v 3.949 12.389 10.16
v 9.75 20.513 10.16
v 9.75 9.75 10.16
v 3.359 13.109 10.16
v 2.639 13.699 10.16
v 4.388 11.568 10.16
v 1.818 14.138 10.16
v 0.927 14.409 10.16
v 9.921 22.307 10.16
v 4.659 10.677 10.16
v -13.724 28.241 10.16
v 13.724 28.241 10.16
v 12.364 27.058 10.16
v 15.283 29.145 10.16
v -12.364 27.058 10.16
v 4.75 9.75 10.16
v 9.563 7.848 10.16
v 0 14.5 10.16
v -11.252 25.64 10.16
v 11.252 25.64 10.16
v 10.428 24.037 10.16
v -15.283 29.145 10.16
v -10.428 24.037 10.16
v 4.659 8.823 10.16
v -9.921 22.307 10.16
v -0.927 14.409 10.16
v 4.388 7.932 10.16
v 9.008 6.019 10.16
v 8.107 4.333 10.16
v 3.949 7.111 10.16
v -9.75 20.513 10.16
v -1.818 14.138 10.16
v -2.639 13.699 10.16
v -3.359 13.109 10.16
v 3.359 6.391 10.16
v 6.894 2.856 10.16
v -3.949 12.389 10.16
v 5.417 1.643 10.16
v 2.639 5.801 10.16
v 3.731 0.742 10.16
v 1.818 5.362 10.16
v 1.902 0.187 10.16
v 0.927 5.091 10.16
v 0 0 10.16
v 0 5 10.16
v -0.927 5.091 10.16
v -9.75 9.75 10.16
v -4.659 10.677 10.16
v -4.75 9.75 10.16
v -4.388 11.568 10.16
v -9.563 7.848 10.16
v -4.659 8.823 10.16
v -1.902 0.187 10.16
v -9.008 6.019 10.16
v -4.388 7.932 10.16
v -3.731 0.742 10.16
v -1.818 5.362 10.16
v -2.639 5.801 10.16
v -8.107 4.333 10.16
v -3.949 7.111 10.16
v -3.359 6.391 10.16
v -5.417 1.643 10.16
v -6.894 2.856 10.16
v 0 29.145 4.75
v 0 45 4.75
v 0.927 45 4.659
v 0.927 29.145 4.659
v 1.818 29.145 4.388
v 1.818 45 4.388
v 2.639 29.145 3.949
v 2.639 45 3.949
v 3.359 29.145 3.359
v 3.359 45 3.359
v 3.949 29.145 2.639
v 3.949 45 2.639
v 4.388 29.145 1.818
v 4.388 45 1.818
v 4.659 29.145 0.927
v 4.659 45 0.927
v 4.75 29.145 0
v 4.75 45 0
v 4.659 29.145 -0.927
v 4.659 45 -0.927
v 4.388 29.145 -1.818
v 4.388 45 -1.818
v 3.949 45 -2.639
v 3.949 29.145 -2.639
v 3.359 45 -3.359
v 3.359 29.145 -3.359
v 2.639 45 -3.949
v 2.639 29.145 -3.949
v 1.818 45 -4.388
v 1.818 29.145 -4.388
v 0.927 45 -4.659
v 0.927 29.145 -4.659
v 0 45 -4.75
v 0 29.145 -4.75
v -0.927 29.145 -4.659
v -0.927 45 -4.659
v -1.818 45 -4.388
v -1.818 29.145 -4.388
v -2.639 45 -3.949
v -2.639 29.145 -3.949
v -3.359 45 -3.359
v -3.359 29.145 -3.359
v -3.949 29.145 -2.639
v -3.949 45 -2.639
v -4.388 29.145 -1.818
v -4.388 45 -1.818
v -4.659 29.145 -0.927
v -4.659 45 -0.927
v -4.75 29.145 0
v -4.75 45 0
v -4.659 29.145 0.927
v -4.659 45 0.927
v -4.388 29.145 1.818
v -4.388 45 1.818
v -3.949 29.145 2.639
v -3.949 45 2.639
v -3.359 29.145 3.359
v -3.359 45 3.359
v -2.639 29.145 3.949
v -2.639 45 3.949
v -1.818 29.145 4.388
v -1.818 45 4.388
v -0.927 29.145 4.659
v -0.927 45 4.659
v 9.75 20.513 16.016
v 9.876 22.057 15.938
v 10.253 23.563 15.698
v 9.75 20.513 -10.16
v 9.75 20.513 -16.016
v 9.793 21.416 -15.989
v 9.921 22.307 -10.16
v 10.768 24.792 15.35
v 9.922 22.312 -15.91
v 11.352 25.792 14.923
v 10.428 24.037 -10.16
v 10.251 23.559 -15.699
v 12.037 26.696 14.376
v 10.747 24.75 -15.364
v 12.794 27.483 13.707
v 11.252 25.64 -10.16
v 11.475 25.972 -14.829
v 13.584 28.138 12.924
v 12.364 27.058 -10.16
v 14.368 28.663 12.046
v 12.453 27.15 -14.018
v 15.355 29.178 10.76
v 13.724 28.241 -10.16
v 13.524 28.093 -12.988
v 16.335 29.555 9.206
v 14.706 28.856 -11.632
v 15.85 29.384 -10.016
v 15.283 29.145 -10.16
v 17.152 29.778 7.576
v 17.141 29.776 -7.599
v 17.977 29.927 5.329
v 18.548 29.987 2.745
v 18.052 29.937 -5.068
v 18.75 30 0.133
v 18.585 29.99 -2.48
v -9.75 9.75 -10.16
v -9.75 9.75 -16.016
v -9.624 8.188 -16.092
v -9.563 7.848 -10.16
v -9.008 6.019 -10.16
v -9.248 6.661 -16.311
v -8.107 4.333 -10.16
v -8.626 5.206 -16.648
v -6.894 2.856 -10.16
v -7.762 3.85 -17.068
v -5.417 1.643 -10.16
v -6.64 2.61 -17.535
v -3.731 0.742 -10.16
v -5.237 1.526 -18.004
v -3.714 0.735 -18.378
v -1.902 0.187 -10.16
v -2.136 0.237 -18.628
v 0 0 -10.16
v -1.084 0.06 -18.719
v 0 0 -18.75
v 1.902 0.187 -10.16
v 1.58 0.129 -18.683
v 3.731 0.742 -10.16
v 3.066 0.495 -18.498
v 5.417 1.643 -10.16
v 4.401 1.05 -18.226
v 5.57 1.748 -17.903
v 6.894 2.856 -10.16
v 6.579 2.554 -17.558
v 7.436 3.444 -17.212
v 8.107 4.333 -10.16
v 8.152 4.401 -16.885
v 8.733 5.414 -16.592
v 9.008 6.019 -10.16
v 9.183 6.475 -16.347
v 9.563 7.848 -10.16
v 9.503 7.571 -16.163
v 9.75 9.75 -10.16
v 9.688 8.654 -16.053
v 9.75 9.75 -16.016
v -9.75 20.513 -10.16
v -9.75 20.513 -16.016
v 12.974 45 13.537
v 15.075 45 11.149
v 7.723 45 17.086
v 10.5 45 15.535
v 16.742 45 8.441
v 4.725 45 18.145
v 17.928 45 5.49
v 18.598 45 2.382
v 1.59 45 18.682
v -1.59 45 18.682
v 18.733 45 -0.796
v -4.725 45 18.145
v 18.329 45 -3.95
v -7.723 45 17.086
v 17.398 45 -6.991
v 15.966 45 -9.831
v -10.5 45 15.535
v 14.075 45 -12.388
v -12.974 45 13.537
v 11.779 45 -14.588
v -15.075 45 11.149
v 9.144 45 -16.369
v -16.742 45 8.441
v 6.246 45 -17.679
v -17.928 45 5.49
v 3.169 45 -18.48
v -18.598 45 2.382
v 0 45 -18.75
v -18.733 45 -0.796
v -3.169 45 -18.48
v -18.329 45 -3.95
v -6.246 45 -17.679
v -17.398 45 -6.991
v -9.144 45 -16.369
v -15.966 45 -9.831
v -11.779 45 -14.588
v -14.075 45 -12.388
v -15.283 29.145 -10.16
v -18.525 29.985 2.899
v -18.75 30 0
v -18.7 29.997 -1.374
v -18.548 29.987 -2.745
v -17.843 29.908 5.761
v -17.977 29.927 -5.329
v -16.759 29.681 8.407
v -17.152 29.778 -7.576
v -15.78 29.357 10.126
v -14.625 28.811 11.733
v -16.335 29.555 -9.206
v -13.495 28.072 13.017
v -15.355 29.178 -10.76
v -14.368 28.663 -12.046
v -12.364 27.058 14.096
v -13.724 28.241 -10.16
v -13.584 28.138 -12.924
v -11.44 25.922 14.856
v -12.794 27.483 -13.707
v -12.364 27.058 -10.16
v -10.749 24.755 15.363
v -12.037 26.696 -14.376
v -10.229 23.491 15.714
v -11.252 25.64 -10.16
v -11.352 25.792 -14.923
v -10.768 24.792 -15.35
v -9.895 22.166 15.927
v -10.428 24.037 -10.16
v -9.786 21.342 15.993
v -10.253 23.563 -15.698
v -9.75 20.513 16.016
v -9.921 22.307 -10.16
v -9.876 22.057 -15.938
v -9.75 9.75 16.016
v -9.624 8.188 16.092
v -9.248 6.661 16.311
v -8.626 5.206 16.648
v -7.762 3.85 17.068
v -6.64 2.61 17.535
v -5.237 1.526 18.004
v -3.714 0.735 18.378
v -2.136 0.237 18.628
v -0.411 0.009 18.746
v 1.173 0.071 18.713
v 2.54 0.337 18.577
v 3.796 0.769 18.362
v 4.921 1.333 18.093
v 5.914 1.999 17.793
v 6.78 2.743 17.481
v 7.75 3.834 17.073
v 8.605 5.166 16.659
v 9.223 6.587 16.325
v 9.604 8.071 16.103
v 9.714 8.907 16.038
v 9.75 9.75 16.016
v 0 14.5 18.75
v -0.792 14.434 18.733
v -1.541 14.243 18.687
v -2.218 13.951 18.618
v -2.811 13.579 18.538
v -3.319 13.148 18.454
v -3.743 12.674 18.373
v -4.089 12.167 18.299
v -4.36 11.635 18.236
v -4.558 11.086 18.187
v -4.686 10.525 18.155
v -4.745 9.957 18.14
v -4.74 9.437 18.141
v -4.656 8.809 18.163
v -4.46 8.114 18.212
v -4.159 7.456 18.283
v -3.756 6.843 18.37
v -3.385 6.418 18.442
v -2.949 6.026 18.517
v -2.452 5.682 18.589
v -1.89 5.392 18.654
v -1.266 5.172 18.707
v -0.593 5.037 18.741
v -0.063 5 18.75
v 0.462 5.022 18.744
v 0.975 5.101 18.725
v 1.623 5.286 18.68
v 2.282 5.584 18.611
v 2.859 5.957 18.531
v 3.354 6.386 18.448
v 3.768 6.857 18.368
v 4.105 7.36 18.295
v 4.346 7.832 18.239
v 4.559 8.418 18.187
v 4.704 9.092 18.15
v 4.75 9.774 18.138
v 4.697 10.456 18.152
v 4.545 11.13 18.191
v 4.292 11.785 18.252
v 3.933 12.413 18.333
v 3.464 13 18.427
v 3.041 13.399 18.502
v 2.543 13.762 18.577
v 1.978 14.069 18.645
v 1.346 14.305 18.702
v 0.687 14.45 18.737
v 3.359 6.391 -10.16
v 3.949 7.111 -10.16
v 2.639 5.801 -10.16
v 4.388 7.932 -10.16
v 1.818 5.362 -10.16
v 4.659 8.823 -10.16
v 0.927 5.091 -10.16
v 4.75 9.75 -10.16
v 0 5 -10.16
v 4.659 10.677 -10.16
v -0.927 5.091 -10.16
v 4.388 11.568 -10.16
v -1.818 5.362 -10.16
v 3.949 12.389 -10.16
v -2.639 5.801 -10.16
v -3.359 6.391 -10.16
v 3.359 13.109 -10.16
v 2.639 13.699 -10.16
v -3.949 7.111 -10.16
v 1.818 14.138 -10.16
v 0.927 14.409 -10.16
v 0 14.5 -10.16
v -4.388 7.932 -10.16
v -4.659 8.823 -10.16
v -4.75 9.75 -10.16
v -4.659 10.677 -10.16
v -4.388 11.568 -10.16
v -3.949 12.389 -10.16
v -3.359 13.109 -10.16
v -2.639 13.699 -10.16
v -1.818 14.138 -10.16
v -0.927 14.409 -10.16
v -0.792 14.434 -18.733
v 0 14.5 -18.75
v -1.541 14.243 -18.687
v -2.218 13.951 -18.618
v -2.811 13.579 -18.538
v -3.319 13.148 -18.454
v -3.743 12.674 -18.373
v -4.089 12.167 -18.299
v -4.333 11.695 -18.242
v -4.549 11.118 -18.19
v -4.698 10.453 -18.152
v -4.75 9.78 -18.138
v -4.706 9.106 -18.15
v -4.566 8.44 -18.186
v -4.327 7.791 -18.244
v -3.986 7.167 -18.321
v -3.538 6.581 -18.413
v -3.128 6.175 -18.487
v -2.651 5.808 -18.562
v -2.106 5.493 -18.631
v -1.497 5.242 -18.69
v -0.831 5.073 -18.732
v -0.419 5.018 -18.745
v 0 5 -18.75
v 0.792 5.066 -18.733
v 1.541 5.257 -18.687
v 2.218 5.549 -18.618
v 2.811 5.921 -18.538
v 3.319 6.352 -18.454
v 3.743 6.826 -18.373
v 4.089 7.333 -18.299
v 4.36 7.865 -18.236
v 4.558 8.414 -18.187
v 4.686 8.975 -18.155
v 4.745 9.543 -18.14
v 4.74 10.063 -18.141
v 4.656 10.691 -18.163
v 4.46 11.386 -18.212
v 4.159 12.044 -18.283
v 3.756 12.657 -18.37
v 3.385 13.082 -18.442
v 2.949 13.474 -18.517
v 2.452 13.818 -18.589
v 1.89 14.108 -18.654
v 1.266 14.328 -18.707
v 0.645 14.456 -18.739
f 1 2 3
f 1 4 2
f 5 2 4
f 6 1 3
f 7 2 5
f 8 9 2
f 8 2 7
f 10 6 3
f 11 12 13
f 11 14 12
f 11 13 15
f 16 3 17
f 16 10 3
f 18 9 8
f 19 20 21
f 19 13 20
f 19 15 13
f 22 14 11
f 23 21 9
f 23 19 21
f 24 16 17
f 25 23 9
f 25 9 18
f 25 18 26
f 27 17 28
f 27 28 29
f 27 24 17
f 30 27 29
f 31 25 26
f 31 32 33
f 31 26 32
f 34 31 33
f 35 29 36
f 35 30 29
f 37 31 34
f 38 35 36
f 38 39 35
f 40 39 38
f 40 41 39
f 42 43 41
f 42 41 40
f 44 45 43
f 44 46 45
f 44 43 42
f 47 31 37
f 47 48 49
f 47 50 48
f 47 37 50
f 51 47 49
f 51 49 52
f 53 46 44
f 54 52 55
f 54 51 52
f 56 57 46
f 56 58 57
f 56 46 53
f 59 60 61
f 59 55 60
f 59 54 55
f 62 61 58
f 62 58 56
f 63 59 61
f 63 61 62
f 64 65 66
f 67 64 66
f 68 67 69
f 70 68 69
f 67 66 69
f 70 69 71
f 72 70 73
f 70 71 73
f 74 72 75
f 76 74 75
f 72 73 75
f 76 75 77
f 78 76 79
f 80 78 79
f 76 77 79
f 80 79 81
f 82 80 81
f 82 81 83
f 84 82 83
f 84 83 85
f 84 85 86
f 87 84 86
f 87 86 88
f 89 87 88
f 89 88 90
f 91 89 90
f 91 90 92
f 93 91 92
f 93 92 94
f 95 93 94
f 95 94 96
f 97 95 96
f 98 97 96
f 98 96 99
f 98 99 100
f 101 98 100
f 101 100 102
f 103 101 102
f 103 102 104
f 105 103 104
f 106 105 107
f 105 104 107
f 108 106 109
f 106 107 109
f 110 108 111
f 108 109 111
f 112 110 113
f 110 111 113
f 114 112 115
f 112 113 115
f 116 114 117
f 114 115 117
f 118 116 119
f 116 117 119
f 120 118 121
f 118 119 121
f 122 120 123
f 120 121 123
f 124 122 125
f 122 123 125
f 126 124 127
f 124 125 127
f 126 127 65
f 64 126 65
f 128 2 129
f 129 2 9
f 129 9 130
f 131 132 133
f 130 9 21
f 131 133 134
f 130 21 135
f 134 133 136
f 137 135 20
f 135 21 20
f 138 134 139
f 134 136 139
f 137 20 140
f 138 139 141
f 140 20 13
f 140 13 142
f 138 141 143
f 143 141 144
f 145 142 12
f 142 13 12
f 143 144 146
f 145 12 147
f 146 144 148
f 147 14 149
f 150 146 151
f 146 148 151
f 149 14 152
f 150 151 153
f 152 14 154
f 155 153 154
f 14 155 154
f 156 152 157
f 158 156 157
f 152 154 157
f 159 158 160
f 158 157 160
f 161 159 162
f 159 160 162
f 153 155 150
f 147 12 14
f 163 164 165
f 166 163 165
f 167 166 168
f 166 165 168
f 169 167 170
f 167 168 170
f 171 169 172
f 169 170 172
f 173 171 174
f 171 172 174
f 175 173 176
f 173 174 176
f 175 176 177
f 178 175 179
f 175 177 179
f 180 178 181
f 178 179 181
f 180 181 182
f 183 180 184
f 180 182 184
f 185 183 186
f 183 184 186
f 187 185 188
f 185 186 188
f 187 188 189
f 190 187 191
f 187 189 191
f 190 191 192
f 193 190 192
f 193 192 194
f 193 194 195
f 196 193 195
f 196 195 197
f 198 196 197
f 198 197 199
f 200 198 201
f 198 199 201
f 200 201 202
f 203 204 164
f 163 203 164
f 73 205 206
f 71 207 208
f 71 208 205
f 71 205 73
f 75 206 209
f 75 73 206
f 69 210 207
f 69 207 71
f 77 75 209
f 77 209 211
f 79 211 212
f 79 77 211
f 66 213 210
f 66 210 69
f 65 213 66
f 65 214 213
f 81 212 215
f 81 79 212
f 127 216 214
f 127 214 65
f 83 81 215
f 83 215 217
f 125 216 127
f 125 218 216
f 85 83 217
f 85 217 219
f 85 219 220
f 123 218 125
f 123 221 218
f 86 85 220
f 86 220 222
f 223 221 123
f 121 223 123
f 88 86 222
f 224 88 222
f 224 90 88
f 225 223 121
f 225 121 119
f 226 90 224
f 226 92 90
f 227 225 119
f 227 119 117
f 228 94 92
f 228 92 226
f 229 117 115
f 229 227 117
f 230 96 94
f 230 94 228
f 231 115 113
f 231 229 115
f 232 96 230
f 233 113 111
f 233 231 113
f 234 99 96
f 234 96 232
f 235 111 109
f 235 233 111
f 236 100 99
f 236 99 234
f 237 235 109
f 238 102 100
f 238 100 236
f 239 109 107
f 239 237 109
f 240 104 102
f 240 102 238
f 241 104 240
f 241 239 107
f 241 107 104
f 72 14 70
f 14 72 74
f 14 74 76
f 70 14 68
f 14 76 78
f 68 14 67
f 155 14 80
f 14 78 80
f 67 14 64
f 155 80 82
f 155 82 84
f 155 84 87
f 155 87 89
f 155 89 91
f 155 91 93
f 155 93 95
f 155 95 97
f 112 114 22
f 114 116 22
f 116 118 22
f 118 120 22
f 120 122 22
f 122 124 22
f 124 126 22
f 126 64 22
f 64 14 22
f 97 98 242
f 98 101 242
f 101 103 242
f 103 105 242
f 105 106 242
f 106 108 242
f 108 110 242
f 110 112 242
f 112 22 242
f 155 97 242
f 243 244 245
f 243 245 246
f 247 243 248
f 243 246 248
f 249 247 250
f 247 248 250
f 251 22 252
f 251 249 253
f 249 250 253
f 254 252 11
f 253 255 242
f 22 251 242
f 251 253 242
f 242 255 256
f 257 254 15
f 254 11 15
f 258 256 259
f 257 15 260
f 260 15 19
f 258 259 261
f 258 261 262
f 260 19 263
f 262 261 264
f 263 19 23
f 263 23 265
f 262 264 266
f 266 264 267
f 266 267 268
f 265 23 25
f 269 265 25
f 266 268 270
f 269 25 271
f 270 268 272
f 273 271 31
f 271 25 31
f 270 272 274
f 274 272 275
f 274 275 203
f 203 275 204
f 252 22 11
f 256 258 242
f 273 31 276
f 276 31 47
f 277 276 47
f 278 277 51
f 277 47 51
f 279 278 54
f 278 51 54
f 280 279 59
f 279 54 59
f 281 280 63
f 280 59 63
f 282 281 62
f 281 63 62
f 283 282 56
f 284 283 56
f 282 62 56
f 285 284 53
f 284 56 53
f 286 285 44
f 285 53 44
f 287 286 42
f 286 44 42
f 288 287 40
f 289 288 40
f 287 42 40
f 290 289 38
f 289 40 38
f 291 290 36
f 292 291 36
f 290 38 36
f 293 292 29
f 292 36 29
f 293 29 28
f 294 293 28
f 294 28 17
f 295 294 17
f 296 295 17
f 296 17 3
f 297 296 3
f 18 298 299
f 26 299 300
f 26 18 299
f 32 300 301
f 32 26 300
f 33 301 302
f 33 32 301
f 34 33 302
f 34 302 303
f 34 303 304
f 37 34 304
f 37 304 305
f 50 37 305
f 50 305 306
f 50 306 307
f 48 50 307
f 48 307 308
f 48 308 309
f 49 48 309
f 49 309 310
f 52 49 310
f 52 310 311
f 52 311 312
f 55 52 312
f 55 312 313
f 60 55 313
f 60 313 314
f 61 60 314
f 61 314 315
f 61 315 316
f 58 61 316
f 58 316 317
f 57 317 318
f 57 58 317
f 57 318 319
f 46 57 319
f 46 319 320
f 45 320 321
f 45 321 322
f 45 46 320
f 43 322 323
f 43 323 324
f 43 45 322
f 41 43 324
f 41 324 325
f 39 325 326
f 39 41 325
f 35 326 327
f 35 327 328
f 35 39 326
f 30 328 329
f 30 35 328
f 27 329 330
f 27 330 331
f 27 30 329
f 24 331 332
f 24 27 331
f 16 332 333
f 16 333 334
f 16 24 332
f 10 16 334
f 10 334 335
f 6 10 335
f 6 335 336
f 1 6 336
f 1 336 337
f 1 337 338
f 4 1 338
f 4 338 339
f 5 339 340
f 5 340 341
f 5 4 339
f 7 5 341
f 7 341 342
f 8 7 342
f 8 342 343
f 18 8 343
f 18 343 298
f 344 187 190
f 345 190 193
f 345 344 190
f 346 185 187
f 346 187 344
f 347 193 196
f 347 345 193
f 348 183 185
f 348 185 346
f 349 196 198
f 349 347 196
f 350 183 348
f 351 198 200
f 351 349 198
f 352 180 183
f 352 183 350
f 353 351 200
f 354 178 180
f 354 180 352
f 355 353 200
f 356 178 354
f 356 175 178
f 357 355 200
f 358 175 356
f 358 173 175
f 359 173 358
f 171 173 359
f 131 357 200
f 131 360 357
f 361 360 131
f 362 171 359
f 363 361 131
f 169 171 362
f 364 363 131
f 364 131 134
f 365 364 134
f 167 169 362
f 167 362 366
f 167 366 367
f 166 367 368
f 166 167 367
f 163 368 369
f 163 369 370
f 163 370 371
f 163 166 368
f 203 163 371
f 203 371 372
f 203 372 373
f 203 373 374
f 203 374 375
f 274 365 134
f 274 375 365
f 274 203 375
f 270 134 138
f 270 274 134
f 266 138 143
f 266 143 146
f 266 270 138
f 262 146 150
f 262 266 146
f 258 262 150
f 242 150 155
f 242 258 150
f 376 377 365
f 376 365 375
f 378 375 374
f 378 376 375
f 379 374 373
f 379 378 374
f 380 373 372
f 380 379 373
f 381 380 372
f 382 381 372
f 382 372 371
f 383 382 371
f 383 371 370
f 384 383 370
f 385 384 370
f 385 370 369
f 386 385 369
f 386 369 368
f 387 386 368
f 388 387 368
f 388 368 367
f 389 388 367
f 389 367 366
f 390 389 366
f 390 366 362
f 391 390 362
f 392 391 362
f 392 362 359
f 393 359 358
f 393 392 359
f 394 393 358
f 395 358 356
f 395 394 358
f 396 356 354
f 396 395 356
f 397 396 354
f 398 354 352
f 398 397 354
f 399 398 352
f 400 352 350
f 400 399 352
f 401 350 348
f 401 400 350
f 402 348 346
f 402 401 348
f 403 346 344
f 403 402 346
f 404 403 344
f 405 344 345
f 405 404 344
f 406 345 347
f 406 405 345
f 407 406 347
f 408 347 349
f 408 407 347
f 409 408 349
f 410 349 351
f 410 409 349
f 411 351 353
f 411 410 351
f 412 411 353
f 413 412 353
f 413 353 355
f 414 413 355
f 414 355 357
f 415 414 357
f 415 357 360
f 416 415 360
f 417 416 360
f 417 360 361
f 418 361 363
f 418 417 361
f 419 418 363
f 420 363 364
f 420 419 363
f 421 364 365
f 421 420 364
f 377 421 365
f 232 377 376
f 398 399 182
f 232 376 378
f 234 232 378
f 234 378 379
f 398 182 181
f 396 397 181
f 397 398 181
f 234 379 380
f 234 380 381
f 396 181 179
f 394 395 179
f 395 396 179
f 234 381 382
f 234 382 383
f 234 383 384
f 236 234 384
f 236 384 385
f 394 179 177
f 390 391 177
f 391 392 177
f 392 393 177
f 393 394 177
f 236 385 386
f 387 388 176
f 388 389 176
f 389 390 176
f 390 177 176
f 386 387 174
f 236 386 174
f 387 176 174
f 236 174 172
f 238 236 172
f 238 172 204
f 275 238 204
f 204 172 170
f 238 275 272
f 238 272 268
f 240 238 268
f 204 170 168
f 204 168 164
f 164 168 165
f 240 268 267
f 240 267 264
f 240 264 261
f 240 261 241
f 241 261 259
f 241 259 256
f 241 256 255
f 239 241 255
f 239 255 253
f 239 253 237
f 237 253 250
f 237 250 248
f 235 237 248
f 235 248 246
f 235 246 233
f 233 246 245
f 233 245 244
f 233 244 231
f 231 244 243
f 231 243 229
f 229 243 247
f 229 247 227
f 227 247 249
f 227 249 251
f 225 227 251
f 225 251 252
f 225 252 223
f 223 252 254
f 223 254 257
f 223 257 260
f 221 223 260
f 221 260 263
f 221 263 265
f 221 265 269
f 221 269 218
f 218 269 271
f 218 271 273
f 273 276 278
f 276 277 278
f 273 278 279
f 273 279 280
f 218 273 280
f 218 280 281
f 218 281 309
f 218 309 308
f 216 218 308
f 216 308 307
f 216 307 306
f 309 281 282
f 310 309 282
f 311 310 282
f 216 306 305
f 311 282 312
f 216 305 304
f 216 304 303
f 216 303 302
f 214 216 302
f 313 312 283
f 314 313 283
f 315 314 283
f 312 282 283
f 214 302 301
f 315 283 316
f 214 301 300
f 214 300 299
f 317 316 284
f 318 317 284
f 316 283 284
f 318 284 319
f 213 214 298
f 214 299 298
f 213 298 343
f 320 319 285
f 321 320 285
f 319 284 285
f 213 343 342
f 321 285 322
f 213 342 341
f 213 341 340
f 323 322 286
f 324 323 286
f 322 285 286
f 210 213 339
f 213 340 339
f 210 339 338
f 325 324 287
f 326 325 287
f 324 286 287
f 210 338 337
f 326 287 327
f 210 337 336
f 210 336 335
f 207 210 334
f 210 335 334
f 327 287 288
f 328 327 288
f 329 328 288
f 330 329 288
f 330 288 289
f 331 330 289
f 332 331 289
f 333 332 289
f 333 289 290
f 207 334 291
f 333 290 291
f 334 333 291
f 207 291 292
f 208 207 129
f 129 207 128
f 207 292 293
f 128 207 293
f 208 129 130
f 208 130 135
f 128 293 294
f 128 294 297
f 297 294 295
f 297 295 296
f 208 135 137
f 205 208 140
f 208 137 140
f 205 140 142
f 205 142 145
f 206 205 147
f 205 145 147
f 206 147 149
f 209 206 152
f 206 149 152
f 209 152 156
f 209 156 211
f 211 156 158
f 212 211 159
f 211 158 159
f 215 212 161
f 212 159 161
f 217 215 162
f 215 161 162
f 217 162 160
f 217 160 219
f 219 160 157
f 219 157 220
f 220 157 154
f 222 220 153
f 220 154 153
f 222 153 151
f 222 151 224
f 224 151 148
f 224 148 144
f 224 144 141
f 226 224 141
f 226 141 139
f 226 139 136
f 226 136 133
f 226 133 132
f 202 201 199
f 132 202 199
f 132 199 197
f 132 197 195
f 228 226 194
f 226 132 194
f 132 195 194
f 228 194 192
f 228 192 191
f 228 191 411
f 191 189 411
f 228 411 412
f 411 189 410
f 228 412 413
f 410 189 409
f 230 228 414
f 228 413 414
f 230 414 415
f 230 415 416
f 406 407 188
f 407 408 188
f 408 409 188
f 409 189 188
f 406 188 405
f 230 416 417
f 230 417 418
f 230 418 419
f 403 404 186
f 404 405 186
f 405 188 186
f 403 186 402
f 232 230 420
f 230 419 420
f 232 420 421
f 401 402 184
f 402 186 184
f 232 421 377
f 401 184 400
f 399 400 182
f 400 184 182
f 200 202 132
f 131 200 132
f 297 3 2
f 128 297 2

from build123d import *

# Parameters (mm, degrees)
SKETCH1_R               = 18.75
BASE_EXTRUDE_DEPTH      = 45
CUT_EXTRUDE1_DEPTH      = 53.231456039
CUT_EXTRUDE1_DEPTH_BACK = 53.231456039
CUT_EXTRUDE5_DEPTH      = 53.231456197
CUT_EXTRUDE5_DEPTH_BACK = 53.231456197
CUT_EXTRUDE6_DEPTH      = 53.231456197
CUT_EXTRUDE6_DEPTH_BACK = 53.231456197
SKETCH11_R              = 4.75
SKETCH12_R              = 4.75
CUT_EXTRUDE7_DEPTH      = 53.231456198


with BuildPart() as part:
    # Sketch1 → Base-Extrude (new body)
    with BuildSketch(Plane(origin=(0, 0, 0), x_dir=(-1, 0, 0), z_dir=(0, 1, 0))):
        Circle(SKETCH1_R)
    extrude(amount=BASE_EXTRUDE_DEPTH)

    # Sketch2 → Cut-Extrude1 (cut, two sides: drawn at the far end of the back side and taken through both)
    with BuildSketch(Plane.XY.offset(-CUT_EXTRUDE1_DEPTH_BACK)):
        with BuildLine():
            Line((-18.75, -127.153745139), (-18.75, 0))
            Line((-18.75, 0), (-18.75, 30))
            ThreePointArc((-18.75, 30), (-12.357975624, 27.051515435), (-9.75, 20.513167019))
            Line((-9.75, 20.513167019), (-9.75, 9.75))
            ThreePointArc((-9.75, 9.75), (0, 0), (9.75, 9.75))
            Line((9.75, 9.75), (9.75, 20.513167019))
            ThreePointArc((9.75, 20.513167019), (12.357975624, 27.051515435), (18.75, 30))
            Line((18.75, 30), (18.75, 0))
            Line((18.75, 0), (18.75, -127.153745139))
            Line((18.75, -127.153745139), (18.75, -381.461235416))
            Line((18.75, -381.461235416), (-18.75, -381.461235416))
            Line((-18.75, -381.461235416), (-18.75, -127.153745139))
        make_face()
    extrude(amount=CUT_EXTRUDE1_DEPTH + CUT_EXTRUDE1_DEPTH_BACK, mode=Mode.SUBTRACT)

    # Sketch8 → Cut-Extrude5 (cut, two sides: drawn at the far end of the back side and taken through both)
    with BuildSketch(Plane(origin=(0, 0, 0), x_dir=(0, 0, -1), z_dir=(1, 0, 0)).offset(-CUT_EXTRUDE5_DEPTH_BACK)):
        Polygon((-10.16, -116.972671553), (-10.16, 0), (-10.16, 29.145238826), (10.16, 29.145238826), (10.16, 0), (10.16, -116.972671553), (10.16, -350.918014658), (-10.16, -350.918014658), align=None)
    extrude(amount=CUT_EXTRUDE5_DEPTH + CUT_EXTRUDE5_DEPTH_BACK, mode=Mode.SUBTRACT)

    # Sketch11 → Cut-Extrude6 (cut, two sides: drawn at the far end of the back side and taken through both)
    with BuildSketch(Plane.XY.offset(-CUT_EXTRUDE6_DEPTH_BACK)):
        with Locations((0, 9.75)):
            Circle(SKETCH11_R)
    extrude(amount=CUT_EXTRUDE6_DEPTH + CUT_EXTRUDE6_DEPTH_BACK, mode=Mode.SUBTRACT)

    # Sketch12 → Cut-Extrude7 (cut, through all)
    with BuildSketch(Plane(origin=(0, 45, 0), x_dir=(-1, 0, 0), z_dir=(0, 1, 0))):
        Circle(SKETCH12_R)
    extrude(amount=-CUT_EXTRUDE7_DEPTH, mode=Mode.SUBTRACT)


solid = part.part
